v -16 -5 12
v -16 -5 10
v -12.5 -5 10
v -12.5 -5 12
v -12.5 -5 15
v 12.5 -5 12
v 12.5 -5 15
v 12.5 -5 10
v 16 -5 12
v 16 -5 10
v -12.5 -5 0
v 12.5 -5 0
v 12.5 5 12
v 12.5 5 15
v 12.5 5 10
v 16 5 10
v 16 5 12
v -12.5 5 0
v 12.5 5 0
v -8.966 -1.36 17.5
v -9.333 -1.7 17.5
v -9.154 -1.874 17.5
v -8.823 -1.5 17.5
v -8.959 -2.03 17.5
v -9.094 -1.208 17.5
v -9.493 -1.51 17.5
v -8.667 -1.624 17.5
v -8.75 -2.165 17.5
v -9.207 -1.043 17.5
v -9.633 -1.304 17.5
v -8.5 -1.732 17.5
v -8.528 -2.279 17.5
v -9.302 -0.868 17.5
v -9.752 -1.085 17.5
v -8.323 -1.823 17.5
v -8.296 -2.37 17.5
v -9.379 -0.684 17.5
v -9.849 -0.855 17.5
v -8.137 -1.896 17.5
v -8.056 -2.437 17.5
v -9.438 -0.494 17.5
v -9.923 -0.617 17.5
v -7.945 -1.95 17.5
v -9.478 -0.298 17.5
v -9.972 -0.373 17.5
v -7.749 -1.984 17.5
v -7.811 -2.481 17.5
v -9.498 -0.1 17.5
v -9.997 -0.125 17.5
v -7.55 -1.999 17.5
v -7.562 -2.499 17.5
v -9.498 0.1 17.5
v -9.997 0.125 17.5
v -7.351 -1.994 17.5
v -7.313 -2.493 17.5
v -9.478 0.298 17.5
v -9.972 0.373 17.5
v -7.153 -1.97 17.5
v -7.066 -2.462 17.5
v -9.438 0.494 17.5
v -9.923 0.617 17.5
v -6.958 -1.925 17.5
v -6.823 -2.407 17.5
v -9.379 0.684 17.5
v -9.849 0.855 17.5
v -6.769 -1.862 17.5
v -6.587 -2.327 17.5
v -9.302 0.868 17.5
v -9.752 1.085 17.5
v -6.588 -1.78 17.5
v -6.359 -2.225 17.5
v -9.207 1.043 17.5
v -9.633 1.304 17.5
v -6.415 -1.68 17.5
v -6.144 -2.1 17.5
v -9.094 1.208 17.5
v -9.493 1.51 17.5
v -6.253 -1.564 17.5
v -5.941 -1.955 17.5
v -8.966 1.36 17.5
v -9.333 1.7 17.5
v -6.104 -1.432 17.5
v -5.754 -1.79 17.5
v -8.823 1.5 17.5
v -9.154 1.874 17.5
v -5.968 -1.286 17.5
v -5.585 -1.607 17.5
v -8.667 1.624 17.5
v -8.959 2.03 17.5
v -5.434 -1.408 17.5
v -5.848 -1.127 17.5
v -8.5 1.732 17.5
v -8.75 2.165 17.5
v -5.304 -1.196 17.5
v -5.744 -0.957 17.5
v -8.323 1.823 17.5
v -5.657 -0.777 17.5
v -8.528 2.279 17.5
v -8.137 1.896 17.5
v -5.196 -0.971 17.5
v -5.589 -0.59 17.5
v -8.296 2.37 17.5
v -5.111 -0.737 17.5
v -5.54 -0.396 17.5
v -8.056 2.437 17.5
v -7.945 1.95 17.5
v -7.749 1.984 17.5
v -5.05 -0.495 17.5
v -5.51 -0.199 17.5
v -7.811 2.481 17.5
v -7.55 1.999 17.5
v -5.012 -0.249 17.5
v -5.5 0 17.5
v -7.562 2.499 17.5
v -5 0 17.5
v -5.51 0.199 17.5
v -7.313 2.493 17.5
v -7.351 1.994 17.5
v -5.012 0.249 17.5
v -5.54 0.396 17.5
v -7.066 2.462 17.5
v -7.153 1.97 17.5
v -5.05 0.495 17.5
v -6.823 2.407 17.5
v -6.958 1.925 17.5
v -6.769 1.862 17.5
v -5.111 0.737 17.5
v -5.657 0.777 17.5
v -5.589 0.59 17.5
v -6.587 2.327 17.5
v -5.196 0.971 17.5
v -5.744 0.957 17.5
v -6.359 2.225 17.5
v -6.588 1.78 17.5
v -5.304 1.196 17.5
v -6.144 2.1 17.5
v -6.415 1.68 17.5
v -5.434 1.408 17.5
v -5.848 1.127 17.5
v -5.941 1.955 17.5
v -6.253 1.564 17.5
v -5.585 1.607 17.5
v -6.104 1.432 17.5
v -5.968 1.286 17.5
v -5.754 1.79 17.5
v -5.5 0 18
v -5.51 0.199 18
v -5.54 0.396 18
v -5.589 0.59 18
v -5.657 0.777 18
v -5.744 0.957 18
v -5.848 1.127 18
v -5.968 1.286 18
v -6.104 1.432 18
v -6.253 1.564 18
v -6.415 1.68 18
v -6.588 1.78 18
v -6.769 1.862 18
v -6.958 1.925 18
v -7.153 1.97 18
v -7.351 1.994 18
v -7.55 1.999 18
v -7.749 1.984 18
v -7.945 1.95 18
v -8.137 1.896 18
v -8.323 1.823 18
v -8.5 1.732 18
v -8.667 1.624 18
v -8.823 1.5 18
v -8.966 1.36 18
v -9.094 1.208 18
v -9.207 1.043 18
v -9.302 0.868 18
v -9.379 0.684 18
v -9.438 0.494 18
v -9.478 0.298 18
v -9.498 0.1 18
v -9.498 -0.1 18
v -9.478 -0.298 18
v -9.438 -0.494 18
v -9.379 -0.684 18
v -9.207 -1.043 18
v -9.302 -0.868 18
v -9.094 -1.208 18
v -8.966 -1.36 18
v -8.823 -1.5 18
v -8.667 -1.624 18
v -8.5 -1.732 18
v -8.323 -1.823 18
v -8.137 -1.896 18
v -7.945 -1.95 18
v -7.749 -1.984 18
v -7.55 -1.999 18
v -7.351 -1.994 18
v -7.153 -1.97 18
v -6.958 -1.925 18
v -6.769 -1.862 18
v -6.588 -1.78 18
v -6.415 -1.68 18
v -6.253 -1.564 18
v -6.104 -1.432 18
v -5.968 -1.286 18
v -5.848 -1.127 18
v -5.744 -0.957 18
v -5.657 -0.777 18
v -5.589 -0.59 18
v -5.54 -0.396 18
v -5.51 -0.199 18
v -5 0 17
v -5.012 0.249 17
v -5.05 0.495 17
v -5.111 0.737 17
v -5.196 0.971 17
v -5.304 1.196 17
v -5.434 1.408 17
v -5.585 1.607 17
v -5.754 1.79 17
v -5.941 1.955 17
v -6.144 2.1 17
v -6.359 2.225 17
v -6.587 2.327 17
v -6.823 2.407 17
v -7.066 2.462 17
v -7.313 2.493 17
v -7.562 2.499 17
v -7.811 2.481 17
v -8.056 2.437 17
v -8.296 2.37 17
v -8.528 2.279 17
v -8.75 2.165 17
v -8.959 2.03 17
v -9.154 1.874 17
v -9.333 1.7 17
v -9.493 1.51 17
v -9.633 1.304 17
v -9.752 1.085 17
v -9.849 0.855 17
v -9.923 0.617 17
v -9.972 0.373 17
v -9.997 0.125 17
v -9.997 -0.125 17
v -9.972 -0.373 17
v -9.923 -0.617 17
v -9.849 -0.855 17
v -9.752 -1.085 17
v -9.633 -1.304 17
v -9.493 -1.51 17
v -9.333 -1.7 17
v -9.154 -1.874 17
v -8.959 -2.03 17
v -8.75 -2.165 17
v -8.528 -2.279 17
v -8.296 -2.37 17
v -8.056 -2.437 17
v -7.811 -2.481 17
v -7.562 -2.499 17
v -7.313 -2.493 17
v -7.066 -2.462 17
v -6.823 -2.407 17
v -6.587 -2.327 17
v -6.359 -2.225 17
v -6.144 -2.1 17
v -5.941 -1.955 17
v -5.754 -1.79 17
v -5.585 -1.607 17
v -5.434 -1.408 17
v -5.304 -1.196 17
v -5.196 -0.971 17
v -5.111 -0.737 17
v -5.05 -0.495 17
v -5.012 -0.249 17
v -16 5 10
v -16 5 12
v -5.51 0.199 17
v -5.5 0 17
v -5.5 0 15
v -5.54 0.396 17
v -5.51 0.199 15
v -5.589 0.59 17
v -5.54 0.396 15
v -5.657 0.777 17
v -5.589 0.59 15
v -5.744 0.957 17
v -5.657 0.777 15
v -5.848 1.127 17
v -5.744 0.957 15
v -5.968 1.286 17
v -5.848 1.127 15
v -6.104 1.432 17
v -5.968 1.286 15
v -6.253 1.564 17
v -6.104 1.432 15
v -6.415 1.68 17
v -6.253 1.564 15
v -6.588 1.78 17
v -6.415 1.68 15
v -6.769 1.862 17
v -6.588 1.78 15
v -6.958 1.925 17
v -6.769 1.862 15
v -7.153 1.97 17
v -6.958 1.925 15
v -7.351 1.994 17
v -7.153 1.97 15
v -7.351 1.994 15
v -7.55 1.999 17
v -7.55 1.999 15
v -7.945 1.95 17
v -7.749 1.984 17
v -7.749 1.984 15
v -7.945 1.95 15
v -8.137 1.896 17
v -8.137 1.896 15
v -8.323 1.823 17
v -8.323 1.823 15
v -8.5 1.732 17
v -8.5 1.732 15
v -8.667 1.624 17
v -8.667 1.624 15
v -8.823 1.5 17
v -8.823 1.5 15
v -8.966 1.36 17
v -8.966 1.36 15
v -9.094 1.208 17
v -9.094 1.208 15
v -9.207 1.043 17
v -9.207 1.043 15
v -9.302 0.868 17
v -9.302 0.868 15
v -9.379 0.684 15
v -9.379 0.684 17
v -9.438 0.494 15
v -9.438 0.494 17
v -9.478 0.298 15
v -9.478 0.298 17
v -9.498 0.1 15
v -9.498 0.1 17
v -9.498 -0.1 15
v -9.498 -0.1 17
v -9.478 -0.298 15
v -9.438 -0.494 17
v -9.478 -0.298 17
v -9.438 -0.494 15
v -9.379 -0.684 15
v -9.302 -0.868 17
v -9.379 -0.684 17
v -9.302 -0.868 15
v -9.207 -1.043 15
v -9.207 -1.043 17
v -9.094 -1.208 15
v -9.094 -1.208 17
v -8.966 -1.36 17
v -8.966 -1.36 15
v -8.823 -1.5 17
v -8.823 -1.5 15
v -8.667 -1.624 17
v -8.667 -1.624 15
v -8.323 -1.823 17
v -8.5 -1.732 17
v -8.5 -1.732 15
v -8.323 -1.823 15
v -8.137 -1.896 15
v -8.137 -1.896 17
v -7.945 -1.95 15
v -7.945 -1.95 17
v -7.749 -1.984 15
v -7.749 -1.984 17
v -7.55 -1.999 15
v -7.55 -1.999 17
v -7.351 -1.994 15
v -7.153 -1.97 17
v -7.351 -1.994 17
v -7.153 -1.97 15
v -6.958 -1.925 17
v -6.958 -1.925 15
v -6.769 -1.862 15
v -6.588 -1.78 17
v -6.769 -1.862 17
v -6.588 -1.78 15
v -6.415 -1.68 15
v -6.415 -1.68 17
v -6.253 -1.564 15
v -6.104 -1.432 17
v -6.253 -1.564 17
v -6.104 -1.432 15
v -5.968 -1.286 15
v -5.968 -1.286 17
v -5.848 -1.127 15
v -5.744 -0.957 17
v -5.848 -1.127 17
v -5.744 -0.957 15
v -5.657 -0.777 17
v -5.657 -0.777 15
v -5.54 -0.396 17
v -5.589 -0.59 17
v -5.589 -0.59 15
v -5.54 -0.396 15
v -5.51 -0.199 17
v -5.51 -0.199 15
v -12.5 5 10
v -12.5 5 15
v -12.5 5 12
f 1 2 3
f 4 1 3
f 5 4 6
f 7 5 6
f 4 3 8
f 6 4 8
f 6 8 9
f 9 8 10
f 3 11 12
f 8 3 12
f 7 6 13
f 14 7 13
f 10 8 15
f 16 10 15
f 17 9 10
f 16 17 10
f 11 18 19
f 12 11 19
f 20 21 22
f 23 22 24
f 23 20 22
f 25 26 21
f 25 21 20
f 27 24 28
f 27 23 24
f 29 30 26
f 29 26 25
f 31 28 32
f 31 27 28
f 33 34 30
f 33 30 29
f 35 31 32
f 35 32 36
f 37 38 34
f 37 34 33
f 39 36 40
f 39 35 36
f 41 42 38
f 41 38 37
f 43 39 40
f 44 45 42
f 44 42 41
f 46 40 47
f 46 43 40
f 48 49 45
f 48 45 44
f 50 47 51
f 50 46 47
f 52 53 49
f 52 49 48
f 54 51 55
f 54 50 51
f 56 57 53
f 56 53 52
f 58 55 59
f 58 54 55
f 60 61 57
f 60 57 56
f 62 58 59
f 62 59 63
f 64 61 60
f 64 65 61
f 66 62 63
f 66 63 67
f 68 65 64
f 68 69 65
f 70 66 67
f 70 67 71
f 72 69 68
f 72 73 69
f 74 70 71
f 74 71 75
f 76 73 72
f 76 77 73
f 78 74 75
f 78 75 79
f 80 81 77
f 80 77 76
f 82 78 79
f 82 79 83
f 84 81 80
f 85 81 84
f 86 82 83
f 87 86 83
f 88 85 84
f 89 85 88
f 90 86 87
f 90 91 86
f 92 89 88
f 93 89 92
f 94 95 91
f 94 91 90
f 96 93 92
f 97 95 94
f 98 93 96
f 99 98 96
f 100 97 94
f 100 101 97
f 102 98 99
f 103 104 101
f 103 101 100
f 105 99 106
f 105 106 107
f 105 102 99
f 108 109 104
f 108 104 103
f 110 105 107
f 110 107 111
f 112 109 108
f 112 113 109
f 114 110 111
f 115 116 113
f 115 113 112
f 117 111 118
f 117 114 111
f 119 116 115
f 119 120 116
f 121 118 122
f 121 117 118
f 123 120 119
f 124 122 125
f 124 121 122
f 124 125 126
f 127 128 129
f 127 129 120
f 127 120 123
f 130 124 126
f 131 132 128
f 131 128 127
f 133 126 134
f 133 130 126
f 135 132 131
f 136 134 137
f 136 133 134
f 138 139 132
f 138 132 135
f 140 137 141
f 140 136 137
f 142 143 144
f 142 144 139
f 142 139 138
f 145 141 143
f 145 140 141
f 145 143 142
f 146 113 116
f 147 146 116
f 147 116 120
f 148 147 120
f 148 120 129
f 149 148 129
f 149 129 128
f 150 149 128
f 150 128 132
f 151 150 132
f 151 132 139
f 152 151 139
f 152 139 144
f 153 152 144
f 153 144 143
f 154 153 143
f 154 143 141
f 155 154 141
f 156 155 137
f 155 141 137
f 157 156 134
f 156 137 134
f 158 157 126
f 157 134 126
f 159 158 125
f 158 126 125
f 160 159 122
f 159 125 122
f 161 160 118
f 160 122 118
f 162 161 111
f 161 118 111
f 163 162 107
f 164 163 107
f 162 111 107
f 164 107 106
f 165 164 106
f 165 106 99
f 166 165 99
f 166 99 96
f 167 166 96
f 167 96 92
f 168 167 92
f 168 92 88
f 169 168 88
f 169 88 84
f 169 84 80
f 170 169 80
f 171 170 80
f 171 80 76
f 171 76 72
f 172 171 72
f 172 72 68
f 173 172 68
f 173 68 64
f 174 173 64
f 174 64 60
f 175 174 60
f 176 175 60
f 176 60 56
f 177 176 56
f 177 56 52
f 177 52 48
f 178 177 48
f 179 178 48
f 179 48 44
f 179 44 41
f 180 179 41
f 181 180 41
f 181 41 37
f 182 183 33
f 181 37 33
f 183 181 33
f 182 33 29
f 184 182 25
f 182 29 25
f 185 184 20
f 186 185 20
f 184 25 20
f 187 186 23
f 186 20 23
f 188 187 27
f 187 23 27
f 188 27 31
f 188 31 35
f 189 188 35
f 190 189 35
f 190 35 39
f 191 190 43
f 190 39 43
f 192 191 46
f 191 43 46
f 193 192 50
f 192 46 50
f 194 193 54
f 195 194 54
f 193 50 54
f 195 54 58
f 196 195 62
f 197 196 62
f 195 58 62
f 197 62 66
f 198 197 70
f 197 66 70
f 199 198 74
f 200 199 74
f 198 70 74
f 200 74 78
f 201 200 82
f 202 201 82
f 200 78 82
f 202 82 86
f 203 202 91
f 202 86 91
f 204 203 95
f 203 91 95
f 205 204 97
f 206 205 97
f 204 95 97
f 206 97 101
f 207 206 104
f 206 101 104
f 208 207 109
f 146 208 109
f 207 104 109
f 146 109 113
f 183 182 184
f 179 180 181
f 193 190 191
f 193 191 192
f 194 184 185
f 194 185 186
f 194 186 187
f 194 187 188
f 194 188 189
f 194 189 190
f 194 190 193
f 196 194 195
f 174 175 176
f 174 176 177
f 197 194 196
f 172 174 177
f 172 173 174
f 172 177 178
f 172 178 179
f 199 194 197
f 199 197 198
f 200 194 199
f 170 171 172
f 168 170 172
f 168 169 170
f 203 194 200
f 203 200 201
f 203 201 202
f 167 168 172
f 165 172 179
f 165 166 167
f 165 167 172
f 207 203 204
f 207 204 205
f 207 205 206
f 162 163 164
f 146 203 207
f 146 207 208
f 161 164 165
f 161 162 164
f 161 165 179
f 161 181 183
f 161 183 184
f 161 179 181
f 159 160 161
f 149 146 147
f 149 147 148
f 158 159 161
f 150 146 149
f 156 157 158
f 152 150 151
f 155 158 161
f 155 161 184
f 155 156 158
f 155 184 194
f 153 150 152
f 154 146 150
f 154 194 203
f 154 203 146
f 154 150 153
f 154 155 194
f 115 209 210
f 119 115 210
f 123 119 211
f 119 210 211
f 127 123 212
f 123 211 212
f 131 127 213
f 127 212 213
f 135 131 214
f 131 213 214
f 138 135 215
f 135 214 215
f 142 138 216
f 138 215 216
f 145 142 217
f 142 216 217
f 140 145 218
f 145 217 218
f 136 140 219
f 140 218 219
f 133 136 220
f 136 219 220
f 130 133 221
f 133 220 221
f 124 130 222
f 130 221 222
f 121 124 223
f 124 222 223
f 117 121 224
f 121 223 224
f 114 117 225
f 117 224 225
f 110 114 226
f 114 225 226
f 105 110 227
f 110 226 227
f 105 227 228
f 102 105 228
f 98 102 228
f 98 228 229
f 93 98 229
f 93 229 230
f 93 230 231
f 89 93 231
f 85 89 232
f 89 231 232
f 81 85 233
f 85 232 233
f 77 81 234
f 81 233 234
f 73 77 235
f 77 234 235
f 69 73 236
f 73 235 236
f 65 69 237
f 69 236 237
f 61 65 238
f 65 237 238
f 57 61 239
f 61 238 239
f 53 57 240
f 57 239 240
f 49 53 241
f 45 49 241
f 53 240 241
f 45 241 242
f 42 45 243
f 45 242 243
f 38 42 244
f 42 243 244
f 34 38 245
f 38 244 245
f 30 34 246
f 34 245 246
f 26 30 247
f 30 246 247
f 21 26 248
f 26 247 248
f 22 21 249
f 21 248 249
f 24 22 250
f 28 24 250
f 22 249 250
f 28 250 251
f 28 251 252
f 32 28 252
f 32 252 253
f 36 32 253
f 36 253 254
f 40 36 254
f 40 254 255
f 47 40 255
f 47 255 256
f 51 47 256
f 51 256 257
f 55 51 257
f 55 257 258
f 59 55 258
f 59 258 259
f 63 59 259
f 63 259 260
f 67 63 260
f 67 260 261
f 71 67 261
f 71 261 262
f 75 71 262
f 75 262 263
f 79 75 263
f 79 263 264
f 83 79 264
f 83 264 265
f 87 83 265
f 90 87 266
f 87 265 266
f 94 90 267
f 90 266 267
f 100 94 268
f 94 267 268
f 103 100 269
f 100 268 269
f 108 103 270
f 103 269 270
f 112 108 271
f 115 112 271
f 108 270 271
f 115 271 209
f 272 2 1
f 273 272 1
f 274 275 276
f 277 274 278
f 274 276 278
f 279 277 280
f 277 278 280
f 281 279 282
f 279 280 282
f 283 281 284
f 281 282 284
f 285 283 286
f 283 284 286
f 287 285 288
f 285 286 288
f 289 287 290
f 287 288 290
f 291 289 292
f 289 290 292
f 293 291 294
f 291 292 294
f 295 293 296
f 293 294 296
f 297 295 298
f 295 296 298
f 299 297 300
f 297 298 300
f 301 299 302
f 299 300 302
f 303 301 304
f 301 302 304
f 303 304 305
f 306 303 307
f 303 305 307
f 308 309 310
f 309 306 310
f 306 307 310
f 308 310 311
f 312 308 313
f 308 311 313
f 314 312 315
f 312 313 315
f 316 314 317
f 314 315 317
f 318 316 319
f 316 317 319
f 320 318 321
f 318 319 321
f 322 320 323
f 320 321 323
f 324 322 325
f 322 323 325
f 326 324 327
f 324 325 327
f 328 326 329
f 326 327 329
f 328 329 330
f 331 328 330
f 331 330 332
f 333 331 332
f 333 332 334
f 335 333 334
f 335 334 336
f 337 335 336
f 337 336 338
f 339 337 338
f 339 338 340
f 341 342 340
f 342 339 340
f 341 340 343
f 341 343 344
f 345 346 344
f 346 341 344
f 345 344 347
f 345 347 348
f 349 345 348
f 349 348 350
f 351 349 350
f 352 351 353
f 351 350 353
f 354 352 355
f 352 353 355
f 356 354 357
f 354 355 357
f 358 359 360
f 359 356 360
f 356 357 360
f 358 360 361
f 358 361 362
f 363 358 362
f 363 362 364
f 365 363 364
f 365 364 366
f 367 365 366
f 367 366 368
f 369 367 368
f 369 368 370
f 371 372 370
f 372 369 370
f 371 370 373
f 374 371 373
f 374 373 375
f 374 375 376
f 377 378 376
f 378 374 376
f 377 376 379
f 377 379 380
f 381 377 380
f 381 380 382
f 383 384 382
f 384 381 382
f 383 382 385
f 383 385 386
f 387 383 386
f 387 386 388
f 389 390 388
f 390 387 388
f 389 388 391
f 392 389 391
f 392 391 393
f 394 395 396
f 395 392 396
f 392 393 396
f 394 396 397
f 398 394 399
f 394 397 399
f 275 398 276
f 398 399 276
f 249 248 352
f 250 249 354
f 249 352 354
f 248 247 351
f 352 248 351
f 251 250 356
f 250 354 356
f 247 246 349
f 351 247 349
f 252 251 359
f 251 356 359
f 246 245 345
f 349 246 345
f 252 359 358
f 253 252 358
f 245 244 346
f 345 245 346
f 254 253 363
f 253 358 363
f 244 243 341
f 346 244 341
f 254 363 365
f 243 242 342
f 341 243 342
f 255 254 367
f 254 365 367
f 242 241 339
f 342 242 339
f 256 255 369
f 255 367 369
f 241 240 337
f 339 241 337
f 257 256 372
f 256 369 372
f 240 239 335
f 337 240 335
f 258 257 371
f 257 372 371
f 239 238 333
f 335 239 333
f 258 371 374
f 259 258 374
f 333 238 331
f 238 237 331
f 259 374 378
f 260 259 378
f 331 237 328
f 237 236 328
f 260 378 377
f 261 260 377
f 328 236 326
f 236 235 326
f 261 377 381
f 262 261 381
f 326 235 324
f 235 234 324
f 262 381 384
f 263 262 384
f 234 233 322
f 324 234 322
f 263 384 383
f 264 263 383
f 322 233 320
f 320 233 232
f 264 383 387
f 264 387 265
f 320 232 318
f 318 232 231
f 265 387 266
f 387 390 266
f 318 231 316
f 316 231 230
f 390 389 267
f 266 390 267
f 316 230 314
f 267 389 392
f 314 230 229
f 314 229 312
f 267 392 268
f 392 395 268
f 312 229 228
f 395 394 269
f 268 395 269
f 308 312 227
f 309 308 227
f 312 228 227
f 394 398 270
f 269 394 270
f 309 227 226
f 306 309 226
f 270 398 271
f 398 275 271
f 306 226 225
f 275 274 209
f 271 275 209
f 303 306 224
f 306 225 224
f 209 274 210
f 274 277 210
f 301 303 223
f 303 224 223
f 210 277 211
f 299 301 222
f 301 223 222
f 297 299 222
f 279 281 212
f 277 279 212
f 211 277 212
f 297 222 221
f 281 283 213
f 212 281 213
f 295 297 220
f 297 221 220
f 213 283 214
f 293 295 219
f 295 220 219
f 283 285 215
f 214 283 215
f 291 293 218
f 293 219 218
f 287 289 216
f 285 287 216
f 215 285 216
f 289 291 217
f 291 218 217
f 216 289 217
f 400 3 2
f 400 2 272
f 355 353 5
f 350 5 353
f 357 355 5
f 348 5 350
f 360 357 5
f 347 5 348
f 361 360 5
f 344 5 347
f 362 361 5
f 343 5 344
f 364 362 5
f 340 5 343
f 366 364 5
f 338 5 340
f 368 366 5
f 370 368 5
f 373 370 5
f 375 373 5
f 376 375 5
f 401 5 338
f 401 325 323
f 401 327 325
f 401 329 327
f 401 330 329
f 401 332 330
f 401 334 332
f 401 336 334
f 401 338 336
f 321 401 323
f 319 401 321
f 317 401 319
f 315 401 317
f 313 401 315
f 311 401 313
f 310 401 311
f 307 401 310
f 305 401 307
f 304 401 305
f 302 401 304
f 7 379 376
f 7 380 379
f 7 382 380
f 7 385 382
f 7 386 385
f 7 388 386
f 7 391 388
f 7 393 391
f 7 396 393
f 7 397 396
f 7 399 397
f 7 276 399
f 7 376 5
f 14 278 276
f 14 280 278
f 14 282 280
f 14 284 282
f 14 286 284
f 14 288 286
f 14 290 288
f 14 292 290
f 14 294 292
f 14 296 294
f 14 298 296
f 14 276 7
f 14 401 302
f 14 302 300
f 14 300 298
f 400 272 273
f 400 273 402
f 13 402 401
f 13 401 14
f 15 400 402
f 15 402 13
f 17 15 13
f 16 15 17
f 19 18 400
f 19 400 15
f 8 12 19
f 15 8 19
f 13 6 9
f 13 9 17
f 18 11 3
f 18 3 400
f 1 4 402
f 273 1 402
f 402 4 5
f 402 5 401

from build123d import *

# Parameters (mm, degrees)
SKETCH_1_W      = 25
SKETCH_1_H      = 10
EXTRUDE_1_DEPTH = 15
SKETCH_2_R      = 2
EXTRUDE_2_DEPTH = 3
SKETCH_3_W      = 2
SKETCH_3_H      = 10
EXTRUDE_3_DEPTH = 3.5
SKETCH_4_W      = 2
SKETCH_4_H      = 10
EXTRUDE_4_DEPTH = 3.5
EXTRUDE_START   = 2
SKETCH_7_R      = 2.5
EXTRUDE_5_DEPTH = 0.5


with BuildPart() as part:
    # 스케치1 → 보스-돌출1 (new body)
    with BuildSketch(Plane.XY):
        Rectangle(SKETCH_1_W, SKETCH_1_H)
    extrude(amount=EXTRUDE_1_DEPTH)

    # 스케치2 → 보스-돌출2 (add)
    with BuildSketch(Plane.XY.offset(15)):
        with Locations((-7.5, 0)):
            Circle(SKETCH_2_R)
    extrude(amount=EXTRUDE_2_DEPTH)

    # 스케치3 → 보스-돌출3 (add)
    with BuildSketch(Plane(origin=(12.5, 0, 0), x_dir=(0, 0, -1), z_dir=(1, 0, 0))):
        with Locations((-11, 0)):
            Rectangle(SKETCH_3_W, SKETCH_3_H)
    extrude(amount=EXTRUDE_3_DEPTH)

    # 스케치4 → 보스-돌출4 (add)
    with BuildSketch(Plane.ZY.offset(12.5)):
        with Locations((11, 0)):
            Rectangle(SKETCH_4_W, SKETCH_4_H)
    extrude(amount=EXTRUDE_4_DEPTH)

    # 스케치7 → 보스-돌출5 (add)
    with BuildSketch(Plane.XY.offset(15).offset(EXTRUDE_START)):
        with Locations((-7.5, 0)):
            Circle(SKETCH_7_R)
    extrude(amount=EXTRUDE_5_DEPTH)


solid = part.part
